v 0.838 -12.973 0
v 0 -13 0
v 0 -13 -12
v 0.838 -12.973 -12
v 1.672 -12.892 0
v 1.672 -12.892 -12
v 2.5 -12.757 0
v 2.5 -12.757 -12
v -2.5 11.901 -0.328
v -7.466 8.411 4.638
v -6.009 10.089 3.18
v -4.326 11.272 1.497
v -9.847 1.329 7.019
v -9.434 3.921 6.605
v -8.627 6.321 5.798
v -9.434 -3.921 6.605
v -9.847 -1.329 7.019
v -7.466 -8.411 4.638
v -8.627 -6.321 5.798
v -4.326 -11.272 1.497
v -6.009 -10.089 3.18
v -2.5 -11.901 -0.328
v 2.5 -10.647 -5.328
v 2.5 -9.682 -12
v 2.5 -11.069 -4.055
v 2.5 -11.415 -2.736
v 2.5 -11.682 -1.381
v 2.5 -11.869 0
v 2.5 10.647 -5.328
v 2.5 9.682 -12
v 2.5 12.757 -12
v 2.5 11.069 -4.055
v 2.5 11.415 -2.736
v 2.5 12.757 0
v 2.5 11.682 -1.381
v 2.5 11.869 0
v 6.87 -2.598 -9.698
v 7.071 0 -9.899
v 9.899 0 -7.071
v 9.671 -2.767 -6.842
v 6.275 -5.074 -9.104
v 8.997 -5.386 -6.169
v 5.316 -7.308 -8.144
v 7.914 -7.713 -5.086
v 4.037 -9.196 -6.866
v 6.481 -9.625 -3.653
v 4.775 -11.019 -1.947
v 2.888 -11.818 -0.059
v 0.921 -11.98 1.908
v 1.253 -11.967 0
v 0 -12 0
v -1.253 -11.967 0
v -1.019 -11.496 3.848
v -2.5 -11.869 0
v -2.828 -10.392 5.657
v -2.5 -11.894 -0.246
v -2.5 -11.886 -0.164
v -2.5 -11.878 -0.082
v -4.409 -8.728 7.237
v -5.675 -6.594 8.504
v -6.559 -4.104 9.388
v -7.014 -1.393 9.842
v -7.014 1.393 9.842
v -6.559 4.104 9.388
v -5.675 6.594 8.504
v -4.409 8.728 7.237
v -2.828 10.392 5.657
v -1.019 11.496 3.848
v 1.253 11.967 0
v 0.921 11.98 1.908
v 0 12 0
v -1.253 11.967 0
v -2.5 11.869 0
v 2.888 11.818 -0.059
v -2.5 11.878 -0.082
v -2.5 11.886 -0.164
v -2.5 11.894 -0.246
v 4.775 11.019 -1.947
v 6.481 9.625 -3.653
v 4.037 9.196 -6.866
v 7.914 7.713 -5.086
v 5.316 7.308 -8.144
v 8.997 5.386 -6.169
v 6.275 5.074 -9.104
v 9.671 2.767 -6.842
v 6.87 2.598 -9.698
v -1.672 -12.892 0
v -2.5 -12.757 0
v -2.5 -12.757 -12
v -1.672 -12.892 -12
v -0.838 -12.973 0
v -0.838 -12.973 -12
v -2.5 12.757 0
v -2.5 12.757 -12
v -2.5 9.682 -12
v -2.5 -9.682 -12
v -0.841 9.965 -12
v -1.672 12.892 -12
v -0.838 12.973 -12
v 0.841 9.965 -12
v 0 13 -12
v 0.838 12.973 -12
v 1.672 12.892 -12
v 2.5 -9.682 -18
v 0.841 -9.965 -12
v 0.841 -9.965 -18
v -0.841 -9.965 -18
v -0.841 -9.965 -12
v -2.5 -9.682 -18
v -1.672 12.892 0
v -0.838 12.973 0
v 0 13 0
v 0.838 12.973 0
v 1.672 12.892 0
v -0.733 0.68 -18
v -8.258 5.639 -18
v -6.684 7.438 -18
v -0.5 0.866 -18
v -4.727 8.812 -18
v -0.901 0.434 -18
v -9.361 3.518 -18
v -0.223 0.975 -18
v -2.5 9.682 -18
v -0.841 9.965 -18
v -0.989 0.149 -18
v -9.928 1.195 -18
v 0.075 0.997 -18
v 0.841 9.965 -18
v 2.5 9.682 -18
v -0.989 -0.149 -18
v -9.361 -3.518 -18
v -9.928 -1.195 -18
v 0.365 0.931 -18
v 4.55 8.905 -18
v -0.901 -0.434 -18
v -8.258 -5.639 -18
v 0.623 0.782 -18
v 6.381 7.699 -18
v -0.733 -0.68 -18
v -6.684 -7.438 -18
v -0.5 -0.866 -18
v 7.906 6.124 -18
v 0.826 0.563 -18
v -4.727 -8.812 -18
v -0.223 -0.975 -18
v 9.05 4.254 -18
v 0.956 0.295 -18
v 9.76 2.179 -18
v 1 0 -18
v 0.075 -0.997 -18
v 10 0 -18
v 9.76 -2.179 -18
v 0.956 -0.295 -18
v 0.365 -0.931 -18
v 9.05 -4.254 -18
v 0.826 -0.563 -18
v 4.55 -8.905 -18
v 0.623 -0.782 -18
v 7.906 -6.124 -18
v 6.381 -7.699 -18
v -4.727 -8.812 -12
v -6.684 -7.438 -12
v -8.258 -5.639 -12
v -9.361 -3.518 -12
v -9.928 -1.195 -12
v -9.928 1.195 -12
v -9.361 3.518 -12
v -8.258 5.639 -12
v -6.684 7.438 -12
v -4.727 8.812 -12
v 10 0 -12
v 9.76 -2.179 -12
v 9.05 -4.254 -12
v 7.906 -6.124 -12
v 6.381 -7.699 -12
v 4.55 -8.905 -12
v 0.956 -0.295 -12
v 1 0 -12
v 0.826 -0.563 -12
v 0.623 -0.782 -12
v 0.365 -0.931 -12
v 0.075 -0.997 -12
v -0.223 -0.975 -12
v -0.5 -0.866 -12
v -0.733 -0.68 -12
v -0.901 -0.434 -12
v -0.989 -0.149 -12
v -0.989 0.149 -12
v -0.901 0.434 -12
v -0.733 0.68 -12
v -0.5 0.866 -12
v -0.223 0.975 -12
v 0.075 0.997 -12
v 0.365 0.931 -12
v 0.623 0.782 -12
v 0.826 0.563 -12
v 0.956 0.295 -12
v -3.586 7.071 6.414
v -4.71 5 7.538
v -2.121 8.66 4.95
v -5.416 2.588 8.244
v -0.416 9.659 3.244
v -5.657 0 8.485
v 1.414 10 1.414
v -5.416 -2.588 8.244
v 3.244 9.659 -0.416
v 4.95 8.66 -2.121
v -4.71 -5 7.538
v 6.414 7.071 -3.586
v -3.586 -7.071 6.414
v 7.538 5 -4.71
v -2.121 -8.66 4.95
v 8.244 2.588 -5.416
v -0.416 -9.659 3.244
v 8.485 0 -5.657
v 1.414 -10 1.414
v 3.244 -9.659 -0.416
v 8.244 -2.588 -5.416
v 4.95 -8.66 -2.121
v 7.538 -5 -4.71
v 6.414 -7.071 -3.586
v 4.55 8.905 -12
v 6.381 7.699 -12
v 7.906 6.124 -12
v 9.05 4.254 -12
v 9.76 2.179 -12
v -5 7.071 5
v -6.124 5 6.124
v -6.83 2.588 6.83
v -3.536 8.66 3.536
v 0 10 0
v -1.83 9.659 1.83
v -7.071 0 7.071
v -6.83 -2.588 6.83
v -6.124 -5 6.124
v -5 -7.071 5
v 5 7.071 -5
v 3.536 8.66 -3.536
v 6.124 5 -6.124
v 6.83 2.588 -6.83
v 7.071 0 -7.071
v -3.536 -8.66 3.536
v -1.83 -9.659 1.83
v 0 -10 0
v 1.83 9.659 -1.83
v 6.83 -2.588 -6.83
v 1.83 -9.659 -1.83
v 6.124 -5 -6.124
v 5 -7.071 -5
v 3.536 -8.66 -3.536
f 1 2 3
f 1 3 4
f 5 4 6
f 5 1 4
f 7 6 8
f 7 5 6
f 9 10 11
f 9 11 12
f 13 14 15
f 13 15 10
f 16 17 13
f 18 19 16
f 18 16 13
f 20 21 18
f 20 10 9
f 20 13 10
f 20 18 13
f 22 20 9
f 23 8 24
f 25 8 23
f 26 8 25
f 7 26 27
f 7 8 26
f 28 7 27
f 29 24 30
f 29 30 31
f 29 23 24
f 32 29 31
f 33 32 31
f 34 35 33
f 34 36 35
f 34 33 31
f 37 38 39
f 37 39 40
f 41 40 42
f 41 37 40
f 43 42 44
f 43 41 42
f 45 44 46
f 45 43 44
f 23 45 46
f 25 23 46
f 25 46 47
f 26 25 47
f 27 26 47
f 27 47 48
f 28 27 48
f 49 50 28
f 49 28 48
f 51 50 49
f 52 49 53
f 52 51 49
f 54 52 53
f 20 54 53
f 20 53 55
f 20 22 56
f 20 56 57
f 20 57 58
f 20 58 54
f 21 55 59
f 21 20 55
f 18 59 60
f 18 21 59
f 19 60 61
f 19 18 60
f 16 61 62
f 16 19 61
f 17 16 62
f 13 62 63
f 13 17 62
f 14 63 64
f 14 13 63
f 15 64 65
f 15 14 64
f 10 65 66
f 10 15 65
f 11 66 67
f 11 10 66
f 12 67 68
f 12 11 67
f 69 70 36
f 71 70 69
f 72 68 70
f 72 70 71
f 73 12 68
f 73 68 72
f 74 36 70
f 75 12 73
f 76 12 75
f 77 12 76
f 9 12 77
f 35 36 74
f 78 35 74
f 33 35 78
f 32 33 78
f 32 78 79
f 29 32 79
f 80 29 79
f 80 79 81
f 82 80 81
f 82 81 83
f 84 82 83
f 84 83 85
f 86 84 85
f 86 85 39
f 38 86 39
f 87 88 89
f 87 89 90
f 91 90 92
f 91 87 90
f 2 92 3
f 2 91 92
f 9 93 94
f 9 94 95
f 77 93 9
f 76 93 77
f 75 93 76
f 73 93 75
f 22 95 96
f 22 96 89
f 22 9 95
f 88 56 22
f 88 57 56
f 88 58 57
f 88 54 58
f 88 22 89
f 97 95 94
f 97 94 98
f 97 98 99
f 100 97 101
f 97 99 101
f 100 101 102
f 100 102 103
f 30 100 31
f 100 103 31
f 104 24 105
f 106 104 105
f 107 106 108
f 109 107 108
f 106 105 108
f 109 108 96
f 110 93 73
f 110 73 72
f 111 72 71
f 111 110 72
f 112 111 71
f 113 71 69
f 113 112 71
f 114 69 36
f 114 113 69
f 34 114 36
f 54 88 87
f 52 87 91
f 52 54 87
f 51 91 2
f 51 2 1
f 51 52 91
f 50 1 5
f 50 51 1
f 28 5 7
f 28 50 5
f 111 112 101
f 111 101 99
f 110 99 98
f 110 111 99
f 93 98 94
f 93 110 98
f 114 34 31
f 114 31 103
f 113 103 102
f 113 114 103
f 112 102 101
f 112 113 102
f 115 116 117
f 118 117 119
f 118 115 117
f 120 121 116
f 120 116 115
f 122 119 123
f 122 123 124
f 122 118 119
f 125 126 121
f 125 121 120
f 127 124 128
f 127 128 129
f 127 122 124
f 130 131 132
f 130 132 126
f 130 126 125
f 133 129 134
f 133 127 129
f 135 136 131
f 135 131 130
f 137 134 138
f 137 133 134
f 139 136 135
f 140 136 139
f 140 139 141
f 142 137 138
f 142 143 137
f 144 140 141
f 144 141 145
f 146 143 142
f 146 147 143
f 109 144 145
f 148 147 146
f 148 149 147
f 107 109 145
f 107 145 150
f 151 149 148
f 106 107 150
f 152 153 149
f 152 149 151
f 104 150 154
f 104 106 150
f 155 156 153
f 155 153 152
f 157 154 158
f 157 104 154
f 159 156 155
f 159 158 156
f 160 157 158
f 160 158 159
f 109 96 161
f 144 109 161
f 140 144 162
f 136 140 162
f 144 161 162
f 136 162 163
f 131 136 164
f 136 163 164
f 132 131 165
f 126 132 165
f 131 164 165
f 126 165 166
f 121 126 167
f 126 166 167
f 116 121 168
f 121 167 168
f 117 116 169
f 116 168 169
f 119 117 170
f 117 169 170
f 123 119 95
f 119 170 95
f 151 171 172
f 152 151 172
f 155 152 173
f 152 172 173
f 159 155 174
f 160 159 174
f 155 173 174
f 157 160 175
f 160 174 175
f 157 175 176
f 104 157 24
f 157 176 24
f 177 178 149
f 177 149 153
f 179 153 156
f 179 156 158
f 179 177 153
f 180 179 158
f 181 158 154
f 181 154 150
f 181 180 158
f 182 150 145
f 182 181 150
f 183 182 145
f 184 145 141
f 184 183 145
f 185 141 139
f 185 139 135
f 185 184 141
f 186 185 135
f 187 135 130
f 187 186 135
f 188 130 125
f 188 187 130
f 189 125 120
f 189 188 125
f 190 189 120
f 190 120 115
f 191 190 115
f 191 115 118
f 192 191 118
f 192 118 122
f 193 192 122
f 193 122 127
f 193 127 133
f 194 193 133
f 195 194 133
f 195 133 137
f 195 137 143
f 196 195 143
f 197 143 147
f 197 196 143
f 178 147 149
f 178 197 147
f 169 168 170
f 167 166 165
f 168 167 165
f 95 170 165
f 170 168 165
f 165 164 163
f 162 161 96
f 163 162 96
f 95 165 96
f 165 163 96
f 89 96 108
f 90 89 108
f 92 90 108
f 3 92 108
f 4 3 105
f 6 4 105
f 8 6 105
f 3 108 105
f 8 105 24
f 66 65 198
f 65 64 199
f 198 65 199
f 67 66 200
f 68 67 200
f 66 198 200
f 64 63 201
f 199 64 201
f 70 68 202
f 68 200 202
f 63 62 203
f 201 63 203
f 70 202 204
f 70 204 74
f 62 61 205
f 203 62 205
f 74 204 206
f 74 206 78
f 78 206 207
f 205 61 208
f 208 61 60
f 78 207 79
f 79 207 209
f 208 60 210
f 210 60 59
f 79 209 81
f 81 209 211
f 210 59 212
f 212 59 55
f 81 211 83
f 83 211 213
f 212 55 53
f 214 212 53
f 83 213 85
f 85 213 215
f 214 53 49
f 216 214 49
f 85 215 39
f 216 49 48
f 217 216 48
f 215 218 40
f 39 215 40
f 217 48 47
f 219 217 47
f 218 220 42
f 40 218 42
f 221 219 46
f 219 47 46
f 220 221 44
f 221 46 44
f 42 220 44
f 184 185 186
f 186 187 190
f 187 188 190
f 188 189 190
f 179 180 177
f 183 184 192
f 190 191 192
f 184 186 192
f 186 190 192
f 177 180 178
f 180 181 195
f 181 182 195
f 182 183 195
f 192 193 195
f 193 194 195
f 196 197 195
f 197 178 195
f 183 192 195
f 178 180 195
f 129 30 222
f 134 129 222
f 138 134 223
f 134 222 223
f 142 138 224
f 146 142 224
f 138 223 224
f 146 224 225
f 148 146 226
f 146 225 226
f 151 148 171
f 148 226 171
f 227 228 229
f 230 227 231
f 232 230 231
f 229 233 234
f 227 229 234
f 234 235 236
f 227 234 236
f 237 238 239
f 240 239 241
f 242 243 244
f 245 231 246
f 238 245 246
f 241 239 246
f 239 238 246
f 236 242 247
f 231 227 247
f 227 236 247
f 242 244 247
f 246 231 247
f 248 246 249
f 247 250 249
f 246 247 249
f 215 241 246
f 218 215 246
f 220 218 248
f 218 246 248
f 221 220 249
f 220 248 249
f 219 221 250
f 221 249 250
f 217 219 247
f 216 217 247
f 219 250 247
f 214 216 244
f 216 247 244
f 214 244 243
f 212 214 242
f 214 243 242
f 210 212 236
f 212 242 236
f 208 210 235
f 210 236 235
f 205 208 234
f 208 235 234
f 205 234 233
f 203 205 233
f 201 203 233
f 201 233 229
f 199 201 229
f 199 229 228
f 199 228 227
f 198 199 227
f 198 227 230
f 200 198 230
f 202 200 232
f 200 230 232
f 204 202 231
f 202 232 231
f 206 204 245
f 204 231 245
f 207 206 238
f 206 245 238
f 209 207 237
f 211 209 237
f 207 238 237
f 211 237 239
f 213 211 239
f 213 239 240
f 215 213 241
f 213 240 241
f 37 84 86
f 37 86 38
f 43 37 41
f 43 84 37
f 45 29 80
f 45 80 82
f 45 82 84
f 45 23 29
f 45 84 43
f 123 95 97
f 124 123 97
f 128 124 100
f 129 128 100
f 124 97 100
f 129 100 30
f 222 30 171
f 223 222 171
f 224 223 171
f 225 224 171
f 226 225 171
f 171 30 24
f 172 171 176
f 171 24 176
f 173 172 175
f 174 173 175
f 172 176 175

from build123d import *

# Parameters (mm, degrees)
F3_R     = 12
F3_R_2   = 10
F4_DEPTH = 2
F5_DEPTH = 12
F6_R     = 1
F7_DEPTH = 6
F8_DEPTH = 2


with BuildPart() as f4:
    # F3 (on 3pt) → F4 (new body, symmetric)
    with BuildSketch(Plane(origin=(0, 0, 0), x_dir=(0.7071067812, 0, -0.7071067812), z_dir=(-0.7071067812, 0, -0.7071067812))):
        Circle(F3_R)
        Circle(F3_R_2, mode=Mode.SUBTRACT)
        Circle(F3_R_2)
    extrude(amount=F4_DEPTH, both=True)

    # F0 (on Top) → F5 (join)
    with BuildSketch(Plane.XY):
        with BuildLine():
            ThreePointArc((-2.5, -12.7573508222), (-1.2558740605, -12.9391955061), (0, -13))
            Line((0, -13), (0, 0))
            Line((0, 0), (-2.5, 0))
            Line((-2.5, 0), (-2.5, -12.7573508222))
        make_face()
        with BuildLine():
            Line((0, 0), (0, 13))
            ThreePointArc((0, 13), (-1.2558740605, 12.9391955061), (-2.5, 12.7573508222))
            Line((-2.5, 12.7573508222), (-2.5, 0))
            Line((-2.5, 0), (0, 0))
        make_face()
        with BuildLine():
            Line((2.5, 0), (2.5, 12.7573508222))
            ThreePointArc((2.5, 12.7573508222), (1.2558740605, 12.9391955061), (0, 13))
            Line((0, 13), (0, 0))
            Line((0, 0), (2.5, 0))
        make_face()
        with BuildLine():
            ThreePointArc((0, -13), (1.2558740605, -12.9391955061), (2.5, -12.7573508222))
            Line((2.5, -12.7573508222), (2.5, 0))
            Line((2.5, 0), (0, 0))
            Line((0, 0), (0, -13))
        make_face()
    extrude(amount=-F5_DEPTH)

    # F6 (on face) → F7 (join)
    with BuildSketch(Plane(origin=(0, 0, -12), x_dir=(1, 0, 0), z_dir=(0, 0, -1))):
        with BuildLine():
            ThreePointArc((2.5, -9.6824583655), (7.9056941504, -6.123724357), (10, 0))
            ThreePointArc((10, 0), (7.9056941504, 6.123724357), (2.5, 9.6824583655))
            Line((2.5, 9.6824583655), (2.5, -9.6824583655))
        make_face()
        with BuildLine():
            Line((-2.5, -9.6824583655), (-2.5, 9.6824583655))
            ThreePointArc((-2.5, 9.6824583655), (-10, 0), (-2.5, -9.6824583655))
        make_face()
        with BuildLine():
            Line((2.5, -9.6824583655), (2.5, 9.6824583655))
            ThreePointArc((2.5, 9.6824583655), (0, 10), (-2.5, 9.6824583655))
            Line((-2.5, 9.6824583655), (-2.5, -9.6824583655))
            ThreePointArc((-2.5, -9.6824583655), (0, -10), (2.5, -9.6824583655))
        make_face()
        Circle(F6_R, mode=Mode.SUBTRACT)
    extrude(amount=F7_DEPTH)

    # F3 (on 3pt) → F8 (cut)
    with BuildSketch(Plane(origin=(0, 0, 0), x_dir=(0.7071067812, 0, -0.7071067812), z_dir=(-0.7071067812, 0, -0.7071067812))):
        Circle(F3_R_2)
    extrude(amount=-F8_DEPTH, mode=Mode.SUBTRACT)


solid = f4.part
